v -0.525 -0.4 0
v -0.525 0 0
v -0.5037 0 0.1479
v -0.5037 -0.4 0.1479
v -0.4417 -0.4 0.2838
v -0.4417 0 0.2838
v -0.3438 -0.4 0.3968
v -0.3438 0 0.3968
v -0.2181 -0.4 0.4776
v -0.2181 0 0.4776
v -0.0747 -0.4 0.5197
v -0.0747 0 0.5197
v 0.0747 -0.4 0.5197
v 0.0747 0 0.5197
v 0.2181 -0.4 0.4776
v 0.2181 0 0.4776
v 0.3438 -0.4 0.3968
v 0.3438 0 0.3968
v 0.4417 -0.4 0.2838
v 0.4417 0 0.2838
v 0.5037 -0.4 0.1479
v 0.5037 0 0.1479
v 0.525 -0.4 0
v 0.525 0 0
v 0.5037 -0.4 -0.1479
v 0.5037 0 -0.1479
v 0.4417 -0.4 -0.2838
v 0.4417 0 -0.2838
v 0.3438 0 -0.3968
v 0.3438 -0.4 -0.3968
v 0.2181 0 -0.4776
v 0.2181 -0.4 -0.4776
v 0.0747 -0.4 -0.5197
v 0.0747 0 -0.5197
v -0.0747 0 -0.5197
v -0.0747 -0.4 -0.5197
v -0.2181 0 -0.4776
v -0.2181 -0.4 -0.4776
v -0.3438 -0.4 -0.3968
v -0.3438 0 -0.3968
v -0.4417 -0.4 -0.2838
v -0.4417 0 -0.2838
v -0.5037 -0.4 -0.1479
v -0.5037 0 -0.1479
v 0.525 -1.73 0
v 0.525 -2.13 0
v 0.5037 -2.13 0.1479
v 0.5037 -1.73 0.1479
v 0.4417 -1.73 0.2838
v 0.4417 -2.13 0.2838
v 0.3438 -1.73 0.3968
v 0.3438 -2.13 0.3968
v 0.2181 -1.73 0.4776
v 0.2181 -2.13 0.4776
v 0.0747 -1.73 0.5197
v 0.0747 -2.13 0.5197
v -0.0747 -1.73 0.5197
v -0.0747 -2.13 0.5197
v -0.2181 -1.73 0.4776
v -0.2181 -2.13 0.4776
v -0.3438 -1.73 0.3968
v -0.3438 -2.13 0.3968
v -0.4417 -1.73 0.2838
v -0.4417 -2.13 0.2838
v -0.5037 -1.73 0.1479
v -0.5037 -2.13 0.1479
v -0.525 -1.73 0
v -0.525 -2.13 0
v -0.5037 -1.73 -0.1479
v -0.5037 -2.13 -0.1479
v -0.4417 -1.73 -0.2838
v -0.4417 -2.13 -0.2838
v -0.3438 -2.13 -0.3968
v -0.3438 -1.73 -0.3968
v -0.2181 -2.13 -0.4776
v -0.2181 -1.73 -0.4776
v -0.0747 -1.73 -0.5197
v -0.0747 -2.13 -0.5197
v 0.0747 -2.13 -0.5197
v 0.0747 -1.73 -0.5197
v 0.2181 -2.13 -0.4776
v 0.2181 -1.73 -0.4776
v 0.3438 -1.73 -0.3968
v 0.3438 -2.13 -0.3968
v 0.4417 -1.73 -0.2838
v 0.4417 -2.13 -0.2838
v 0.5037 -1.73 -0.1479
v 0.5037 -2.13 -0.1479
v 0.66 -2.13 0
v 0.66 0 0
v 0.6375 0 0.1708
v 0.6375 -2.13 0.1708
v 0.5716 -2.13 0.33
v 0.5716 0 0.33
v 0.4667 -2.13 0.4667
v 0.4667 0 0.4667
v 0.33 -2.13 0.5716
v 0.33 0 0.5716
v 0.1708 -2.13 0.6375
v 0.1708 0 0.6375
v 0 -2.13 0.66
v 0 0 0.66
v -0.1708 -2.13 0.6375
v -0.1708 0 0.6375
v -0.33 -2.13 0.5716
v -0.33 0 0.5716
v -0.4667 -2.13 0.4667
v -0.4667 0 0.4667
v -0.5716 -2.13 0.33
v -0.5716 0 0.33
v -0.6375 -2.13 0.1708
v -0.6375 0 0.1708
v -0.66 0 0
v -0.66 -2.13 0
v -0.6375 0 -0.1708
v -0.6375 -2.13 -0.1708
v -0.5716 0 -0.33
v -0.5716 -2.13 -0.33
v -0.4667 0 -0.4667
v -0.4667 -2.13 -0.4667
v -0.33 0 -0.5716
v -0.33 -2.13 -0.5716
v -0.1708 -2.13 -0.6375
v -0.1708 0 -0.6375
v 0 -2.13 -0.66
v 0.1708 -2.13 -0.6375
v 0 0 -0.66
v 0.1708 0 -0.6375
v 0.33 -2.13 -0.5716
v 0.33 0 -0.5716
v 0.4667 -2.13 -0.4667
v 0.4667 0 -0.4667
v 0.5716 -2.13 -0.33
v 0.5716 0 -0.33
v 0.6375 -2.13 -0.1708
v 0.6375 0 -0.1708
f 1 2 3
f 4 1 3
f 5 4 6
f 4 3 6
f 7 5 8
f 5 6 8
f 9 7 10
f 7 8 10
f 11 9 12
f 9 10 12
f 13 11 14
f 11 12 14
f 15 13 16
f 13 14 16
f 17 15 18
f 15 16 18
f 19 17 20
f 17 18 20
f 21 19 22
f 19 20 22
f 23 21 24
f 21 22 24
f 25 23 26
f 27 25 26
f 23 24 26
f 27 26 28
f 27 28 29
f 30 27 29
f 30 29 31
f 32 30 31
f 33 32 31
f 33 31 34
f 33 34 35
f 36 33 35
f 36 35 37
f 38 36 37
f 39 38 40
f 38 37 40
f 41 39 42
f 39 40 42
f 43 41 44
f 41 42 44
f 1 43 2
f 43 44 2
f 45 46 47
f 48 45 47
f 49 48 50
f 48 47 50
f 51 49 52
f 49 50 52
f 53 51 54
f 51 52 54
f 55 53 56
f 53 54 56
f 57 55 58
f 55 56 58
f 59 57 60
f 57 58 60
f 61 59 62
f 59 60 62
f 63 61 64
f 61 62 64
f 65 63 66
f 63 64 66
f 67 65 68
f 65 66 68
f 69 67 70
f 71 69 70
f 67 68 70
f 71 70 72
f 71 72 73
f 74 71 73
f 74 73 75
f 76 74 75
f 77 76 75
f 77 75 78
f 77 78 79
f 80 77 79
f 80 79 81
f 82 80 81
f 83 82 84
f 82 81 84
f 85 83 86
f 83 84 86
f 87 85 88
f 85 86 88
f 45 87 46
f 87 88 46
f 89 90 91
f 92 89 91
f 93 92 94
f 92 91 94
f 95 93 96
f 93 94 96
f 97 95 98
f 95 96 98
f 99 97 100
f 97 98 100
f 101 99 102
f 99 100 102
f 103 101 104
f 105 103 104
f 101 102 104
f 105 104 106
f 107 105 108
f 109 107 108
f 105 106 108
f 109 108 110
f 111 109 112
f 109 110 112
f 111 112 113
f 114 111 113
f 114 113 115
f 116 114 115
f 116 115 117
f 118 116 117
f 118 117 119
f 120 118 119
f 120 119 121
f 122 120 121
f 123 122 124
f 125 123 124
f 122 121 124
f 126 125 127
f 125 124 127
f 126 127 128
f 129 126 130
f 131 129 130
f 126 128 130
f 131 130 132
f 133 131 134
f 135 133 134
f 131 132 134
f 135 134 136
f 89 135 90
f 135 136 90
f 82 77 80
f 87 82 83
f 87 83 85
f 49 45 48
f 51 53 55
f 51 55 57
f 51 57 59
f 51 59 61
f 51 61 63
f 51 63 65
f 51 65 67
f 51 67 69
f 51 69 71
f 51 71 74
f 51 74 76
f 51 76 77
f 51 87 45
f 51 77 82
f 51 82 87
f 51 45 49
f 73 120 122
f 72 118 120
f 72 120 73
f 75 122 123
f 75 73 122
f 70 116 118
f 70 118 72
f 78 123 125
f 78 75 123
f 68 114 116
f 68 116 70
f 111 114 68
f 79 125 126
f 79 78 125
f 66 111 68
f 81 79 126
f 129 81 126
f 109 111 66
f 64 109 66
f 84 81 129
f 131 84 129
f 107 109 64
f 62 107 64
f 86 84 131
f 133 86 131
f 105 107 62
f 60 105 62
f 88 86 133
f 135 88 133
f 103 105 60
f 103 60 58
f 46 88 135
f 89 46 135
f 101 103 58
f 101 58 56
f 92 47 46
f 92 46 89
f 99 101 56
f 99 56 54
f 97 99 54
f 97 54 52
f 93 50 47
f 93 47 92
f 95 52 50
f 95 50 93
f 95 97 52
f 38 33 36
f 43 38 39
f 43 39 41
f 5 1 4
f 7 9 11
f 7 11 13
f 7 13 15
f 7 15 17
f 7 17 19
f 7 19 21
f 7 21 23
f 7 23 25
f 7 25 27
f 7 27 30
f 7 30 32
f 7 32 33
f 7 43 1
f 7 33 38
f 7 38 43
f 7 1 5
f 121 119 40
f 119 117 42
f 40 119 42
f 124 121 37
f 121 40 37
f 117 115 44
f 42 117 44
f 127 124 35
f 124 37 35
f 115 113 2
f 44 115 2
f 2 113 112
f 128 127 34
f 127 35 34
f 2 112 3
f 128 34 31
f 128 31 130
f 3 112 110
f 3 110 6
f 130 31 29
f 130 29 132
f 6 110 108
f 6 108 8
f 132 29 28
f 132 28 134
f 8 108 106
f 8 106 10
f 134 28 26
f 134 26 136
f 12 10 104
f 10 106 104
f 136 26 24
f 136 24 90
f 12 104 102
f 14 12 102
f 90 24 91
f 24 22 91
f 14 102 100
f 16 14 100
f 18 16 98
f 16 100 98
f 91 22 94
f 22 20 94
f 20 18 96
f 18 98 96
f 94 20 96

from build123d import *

# Parameters (mm, degrees)
F0_R     = 0.66
F1_DEPTH = 2.13
F2_R     = 0.525
F3_DEPTH = 0.4
F4_R     = 0.525
F5_DEPTH = 0.4


with BuildPart() as f1:
    # F0 (on Front) → F1 (new body)
    with BuildSketch(Plane.XZ):
        Circle(F0_R)
    extrude(amount=F1_DEPTH)

    # F2 (on face) → F3 (cut)
    with BuildSketch(Plane(origin=(0, 0, 0), x_dir=(-1, 0, 0), z_dir=(0, 1, 0))):
        Circle(F2_R)
    extrude(amount=-F3_DEPTH, mode=Mode.SUBTRACT)

    # F4 (on face) → F5 (cut)
    with BuildSketch(Plane.XZ.offset(2.13)):
        Circle(F4_R)
    extrude(amount=-F5_DEPTH, mode=Mode.SUBTRACT)


solid = f1.part
